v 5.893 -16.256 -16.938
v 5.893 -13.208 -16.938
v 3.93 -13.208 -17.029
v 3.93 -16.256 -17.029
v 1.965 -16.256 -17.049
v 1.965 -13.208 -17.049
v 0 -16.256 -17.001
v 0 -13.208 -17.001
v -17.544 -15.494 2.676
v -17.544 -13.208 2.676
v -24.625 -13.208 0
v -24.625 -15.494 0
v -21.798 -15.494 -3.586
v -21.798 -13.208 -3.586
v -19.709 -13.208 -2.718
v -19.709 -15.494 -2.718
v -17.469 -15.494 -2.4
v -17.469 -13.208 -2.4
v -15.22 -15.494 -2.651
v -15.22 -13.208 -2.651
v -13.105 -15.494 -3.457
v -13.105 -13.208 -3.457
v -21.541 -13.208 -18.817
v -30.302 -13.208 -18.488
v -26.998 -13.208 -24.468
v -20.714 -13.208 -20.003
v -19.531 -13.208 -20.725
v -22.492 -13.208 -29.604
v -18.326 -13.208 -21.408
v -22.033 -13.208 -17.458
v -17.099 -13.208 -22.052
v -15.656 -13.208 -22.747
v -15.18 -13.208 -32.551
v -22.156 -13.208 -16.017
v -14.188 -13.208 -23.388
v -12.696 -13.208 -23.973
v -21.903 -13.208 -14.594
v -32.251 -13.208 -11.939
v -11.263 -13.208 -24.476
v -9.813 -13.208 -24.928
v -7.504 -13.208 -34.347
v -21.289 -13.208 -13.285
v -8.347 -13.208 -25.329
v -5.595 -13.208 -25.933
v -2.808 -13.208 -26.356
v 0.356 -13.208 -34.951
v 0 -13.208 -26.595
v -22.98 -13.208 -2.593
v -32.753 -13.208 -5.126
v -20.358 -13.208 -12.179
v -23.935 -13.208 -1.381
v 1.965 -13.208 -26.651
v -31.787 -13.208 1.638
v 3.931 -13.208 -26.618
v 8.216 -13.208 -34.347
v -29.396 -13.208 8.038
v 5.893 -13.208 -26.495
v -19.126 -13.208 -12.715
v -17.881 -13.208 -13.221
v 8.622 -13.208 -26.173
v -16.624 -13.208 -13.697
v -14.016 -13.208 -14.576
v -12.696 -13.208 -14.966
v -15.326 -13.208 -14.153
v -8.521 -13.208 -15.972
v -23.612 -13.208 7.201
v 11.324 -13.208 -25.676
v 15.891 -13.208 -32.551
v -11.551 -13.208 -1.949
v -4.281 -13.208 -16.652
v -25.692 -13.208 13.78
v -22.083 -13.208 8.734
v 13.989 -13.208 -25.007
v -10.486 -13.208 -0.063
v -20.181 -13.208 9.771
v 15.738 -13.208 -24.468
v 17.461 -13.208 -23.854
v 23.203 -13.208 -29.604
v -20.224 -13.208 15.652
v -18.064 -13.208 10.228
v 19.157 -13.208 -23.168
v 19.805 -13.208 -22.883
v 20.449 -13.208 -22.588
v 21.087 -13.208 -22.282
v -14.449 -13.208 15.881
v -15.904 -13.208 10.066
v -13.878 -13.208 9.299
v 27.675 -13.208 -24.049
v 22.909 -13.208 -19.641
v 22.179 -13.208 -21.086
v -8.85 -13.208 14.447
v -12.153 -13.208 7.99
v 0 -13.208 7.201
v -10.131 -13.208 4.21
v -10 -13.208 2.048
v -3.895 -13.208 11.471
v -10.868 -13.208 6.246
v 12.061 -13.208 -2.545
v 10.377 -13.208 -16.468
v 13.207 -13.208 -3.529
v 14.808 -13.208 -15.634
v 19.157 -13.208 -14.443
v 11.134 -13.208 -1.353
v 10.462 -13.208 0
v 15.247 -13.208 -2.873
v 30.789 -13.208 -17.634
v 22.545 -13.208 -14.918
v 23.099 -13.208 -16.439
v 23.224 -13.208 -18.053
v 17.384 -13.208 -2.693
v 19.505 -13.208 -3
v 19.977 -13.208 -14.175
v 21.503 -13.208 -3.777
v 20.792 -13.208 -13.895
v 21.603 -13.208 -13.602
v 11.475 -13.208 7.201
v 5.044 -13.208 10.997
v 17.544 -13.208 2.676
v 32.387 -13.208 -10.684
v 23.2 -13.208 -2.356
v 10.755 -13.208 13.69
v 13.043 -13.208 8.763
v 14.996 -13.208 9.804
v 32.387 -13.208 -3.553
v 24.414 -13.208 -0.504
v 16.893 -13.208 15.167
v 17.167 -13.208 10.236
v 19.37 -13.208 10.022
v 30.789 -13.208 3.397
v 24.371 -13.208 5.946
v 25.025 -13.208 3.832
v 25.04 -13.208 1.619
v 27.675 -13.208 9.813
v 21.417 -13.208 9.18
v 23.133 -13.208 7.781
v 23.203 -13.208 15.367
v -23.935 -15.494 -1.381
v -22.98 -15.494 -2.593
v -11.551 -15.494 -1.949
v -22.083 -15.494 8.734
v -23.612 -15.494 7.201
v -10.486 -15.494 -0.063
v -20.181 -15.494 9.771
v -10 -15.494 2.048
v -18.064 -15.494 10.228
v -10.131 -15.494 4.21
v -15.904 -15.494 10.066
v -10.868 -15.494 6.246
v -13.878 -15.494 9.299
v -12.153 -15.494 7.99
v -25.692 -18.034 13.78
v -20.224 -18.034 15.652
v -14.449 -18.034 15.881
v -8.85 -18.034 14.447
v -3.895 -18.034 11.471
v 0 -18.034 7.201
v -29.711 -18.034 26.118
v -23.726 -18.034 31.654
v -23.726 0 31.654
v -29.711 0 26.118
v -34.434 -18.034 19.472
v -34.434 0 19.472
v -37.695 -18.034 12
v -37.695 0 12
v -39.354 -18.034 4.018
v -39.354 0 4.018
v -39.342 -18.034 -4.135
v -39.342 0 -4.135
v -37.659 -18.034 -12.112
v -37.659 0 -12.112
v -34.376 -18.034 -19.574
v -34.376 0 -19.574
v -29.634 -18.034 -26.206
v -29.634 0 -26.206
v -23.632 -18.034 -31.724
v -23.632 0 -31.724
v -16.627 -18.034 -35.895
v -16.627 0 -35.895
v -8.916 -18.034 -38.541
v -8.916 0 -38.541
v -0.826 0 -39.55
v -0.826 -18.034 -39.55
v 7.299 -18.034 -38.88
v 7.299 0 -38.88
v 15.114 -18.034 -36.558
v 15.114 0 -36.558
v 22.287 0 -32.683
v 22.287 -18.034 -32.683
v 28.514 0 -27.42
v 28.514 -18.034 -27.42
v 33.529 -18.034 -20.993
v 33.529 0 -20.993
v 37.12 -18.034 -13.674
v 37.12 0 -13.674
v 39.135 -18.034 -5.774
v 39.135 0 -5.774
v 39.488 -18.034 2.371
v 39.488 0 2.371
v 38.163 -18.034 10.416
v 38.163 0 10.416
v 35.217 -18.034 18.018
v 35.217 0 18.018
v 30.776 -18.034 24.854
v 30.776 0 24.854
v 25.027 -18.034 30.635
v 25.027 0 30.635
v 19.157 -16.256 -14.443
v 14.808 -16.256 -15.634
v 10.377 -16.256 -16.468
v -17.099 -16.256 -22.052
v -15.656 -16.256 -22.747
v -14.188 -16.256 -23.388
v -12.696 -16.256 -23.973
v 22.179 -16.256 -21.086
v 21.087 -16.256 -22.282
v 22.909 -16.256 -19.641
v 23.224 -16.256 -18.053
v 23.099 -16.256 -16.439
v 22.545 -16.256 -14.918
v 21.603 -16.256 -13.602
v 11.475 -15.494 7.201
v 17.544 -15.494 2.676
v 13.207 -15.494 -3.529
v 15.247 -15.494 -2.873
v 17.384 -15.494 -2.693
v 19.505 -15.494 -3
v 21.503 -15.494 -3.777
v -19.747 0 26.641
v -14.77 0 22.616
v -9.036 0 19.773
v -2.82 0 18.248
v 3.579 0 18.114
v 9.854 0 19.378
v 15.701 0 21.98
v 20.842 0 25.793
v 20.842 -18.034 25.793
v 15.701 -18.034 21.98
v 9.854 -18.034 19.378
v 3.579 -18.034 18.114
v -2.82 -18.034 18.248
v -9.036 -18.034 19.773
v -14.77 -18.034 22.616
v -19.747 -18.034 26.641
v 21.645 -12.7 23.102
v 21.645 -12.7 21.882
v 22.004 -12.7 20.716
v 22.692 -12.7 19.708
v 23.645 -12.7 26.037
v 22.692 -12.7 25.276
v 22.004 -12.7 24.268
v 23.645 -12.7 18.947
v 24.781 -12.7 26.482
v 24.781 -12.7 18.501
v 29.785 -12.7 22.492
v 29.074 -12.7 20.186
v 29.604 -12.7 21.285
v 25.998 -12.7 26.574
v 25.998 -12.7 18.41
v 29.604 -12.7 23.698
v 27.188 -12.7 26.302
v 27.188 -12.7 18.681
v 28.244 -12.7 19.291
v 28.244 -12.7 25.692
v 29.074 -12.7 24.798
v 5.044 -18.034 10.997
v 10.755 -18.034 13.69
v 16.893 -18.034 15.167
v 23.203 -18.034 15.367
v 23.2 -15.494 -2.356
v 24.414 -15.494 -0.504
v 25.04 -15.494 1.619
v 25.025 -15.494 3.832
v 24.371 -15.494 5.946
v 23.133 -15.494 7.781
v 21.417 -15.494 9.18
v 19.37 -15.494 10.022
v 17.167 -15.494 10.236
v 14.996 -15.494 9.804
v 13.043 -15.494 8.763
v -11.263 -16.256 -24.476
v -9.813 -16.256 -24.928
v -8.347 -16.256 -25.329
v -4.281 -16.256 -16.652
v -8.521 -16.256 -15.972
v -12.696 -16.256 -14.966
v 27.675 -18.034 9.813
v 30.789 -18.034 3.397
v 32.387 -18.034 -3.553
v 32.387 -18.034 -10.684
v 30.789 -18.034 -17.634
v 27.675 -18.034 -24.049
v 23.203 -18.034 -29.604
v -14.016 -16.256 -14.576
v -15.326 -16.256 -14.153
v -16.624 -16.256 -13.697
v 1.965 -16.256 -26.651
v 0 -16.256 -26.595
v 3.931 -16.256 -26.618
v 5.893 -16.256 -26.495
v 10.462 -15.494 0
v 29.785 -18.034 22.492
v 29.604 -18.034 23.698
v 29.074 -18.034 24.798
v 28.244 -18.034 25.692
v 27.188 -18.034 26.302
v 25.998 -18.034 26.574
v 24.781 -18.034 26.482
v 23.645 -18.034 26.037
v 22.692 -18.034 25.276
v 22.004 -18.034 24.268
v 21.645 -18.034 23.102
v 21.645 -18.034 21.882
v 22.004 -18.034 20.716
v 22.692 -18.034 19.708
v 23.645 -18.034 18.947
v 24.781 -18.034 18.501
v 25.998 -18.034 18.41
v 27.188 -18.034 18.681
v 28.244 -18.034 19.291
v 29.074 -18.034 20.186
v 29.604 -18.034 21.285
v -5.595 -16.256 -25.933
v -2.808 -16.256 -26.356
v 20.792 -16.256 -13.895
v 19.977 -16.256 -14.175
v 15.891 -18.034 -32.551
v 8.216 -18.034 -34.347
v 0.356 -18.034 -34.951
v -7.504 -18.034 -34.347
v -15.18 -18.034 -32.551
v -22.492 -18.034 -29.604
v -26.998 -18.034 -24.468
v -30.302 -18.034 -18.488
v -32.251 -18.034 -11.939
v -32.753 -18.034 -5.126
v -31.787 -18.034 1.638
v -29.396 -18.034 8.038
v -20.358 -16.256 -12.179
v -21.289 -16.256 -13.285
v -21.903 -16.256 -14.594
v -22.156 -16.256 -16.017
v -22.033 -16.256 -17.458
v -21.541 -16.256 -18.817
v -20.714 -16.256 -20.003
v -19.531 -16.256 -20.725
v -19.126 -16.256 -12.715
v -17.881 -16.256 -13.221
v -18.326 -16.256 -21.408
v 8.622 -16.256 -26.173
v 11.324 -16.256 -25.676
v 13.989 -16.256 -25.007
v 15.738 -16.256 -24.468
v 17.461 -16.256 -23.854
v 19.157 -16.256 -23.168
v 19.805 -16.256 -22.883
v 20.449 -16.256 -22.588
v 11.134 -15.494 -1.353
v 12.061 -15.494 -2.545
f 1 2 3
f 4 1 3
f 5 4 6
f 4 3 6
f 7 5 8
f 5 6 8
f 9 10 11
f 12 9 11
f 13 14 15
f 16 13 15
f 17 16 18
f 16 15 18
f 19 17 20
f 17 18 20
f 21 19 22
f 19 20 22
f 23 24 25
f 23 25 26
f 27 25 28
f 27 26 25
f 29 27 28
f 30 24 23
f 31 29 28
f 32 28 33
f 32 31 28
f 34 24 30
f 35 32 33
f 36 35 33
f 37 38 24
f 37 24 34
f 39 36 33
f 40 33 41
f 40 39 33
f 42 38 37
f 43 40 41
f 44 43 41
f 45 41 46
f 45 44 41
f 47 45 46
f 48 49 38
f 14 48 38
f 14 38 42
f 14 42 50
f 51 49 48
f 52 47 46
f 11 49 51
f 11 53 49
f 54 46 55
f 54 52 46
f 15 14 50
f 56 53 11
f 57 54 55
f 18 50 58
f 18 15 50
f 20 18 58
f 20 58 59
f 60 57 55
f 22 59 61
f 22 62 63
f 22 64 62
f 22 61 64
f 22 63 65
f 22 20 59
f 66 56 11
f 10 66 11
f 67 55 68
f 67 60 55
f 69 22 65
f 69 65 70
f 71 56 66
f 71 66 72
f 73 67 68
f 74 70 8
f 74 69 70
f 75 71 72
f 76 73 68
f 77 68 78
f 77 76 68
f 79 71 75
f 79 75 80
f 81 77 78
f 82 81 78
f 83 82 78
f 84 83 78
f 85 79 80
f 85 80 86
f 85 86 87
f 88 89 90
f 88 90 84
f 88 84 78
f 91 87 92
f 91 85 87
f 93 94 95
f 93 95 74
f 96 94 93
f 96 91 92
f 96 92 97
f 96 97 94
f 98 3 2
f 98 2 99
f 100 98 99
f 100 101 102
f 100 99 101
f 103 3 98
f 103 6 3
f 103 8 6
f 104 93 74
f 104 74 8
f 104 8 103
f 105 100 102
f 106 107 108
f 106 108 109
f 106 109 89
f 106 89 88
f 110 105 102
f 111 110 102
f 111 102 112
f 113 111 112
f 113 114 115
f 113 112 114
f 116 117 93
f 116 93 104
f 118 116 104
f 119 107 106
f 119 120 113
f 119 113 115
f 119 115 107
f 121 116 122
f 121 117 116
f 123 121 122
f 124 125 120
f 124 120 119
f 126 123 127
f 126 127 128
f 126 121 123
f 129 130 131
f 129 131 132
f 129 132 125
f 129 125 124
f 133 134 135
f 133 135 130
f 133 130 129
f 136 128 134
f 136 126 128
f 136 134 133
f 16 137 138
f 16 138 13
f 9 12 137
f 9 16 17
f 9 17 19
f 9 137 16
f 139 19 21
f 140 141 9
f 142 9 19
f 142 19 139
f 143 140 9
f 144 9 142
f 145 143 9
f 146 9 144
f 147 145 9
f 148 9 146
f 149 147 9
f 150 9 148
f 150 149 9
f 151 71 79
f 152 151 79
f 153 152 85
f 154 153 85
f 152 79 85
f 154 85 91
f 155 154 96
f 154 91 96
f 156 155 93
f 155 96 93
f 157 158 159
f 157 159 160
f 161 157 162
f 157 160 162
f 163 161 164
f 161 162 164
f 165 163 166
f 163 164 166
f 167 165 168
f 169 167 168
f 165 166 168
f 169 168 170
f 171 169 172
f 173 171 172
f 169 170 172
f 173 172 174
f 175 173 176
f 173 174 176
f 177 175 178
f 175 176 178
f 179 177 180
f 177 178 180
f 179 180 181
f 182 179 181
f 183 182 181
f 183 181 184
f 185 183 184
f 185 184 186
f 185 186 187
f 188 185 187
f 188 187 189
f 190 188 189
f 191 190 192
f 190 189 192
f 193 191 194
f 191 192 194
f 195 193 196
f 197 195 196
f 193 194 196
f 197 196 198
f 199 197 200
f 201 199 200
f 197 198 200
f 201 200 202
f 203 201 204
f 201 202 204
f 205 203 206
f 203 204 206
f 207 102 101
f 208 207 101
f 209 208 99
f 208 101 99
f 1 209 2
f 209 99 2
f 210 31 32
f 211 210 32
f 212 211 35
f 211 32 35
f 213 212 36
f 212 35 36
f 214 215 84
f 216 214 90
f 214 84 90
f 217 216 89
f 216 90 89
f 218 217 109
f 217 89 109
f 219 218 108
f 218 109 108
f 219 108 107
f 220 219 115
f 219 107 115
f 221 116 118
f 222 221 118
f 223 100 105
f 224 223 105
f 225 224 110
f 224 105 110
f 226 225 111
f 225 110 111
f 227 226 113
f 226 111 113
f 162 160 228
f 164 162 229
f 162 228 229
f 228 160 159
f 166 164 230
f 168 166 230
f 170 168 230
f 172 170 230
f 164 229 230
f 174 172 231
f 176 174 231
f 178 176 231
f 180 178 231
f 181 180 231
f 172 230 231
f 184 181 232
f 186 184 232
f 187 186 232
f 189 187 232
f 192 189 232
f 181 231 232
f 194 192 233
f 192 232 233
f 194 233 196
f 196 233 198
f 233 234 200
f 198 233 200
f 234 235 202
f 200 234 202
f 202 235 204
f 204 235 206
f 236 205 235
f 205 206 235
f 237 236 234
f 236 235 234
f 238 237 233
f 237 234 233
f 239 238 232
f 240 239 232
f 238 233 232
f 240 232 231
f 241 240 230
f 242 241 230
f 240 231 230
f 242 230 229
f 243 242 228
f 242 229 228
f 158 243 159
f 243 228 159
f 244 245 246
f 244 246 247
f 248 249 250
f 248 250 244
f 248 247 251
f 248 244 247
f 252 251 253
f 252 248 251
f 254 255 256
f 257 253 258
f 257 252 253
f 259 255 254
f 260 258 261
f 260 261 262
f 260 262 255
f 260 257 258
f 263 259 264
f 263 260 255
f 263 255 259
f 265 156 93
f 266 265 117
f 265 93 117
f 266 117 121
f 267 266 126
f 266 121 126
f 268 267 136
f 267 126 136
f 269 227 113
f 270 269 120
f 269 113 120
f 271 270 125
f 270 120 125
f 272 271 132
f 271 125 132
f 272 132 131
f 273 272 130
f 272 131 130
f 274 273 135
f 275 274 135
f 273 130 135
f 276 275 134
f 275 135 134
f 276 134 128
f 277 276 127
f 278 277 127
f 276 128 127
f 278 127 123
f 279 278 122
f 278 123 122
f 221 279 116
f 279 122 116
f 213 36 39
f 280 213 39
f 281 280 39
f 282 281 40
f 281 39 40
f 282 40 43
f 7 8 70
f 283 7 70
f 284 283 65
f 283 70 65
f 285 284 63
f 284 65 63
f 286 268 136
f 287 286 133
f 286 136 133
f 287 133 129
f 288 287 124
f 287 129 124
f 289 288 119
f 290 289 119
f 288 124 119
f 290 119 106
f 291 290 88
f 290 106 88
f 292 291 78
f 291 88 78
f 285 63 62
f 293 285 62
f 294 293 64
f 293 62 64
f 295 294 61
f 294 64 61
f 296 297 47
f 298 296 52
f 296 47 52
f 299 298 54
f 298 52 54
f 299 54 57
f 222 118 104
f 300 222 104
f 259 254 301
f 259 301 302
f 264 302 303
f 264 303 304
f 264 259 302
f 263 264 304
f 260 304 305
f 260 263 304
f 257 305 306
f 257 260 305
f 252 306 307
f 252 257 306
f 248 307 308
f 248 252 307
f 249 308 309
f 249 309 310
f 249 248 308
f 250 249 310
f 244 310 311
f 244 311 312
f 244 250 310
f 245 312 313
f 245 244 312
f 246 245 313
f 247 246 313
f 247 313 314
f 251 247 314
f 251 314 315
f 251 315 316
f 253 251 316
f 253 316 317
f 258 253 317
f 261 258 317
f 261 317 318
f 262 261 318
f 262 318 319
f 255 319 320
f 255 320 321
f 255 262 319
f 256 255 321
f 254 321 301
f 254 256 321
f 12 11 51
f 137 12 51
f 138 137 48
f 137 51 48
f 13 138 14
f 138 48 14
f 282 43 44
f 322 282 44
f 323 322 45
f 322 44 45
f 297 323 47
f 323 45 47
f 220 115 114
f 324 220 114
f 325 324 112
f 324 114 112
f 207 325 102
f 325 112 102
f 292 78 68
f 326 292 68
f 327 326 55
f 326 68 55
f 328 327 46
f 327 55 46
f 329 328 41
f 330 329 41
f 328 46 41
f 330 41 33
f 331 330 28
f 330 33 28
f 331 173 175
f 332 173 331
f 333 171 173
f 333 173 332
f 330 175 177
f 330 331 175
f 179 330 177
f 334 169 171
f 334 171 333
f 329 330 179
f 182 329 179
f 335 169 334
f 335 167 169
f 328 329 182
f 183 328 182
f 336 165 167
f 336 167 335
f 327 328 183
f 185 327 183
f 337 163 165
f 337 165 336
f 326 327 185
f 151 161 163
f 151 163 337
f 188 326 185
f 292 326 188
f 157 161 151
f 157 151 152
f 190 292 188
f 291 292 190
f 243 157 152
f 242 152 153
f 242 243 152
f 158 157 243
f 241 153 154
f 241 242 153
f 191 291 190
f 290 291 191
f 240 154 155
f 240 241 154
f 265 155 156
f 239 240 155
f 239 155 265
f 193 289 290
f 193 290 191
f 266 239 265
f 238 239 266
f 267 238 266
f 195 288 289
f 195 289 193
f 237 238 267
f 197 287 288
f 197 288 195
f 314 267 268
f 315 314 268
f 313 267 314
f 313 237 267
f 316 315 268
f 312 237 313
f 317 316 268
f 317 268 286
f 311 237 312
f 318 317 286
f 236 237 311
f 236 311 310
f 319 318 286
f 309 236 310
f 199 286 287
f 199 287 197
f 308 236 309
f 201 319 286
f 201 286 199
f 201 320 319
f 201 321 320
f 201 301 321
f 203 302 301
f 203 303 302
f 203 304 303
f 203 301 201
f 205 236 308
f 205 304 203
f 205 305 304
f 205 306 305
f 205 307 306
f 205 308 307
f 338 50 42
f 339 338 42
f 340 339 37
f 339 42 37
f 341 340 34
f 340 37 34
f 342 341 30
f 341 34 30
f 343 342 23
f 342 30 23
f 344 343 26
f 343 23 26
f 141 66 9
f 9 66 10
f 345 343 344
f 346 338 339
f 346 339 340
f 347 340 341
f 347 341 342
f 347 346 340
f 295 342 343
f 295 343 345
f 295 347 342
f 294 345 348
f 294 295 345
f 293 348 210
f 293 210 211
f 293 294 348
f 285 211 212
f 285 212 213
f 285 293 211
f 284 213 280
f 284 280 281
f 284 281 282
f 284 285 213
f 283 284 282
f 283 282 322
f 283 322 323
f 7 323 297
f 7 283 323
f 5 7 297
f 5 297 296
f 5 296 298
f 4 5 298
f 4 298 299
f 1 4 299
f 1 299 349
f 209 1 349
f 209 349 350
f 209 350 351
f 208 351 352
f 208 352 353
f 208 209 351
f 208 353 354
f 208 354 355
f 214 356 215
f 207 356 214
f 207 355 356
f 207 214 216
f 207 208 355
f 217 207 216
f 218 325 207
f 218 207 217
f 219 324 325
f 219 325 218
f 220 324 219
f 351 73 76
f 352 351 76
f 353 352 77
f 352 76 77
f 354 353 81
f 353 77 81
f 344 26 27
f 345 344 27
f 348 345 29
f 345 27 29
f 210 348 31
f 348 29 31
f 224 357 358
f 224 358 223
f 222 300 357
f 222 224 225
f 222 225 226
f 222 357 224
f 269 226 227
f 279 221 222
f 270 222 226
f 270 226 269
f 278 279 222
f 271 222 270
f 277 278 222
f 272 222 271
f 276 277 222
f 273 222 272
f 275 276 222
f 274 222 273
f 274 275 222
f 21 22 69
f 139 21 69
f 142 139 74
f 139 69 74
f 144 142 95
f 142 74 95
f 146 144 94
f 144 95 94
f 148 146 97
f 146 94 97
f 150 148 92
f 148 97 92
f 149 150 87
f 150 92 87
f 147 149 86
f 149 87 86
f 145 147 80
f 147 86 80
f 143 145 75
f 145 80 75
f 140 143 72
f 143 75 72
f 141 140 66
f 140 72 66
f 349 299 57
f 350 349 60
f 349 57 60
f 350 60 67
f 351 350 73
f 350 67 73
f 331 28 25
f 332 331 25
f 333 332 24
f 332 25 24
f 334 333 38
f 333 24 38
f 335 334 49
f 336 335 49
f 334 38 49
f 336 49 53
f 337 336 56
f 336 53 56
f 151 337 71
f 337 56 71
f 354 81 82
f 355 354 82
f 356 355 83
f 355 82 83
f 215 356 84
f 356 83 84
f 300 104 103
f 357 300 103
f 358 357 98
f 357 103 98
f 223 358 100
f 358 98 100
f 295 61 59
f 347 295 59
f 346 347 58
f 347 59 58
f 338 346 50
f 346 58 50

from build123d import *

# Parameters (mm, degrees)
F1_DEPTH = 12.7
F4_DEPTH = 2.794
F5_DEPTH = 3.556
F7_DEPTH = 0.508
F8_R     = 4.0932616512
F9_DEPTH = 5.334


with BuildPart() as f1:
    # F0 (on Front) → F1 (new body)
    with BuildSketch(Plane.XZ):
        with BuildLine():
            ThreePointArc((25.0273931209, 30.6353052518), (0.3760595222, 18.0051146813), (-23.726411007, 31.6535899232))
            ThreePointArc((-23.726411007, 31.6535899232), (-0.8260535898, -39.5500944344), (25.0273931209, 30.6353052518))
        make_face()
    extrude(amount=F1_DEPTH)

    # F2 (on face) → F4 (join)
    with BuildSketch(Plane.XZ.offset(12.7)):
        with BuildLine():
            Line((-17.5436979513, 2.6755574061), (-24.6252994984, 0))
            ThreePointArc((-24.6252994984, 0), (-23.4886257248, -2.0111815106), (-21.798320189, -3.5859022896))
            ThreePointArc((-21.798320189, -3.5859022896), (-17.4685188777, -2.3995249593), (-13.1054765957, -3.4571319799))
            ThreePointArc((-13.1054765957, -3.4571319799), (-12.1526852264, 7.9901288569), (-23.6123846381, 7.2009004653))
            Line((-23.6123846381, 7.2009004653), (-17.5436979513, 2.6755574061))
        make_face()
        with BuildLine():
            ThreePointArc((21.5031847078, -3.7765858449), (23.1328376444, 7.7813585574), (11.4750112645, 7.2009004653))
            Line((11.4750112645, 7.2009004653), (17.5436979513, 2.6755574061))
            Line((17.5436979513, 2.6755574061), (10.4620964041, 0))
            ThreePointArc((10.4620964041, 0), (11.5679326814, -1.971798546), (13.2067047826, -3.5291326072))
            ThreePointArc((13.2067047826, -3.5291326072), (17.3835685766, -2.6931747019), (21.5031847078, -3.7765858449))
        make_face()
    extrude(amount=F4_DEPTH)

    # F3 (on face) → F5 (join)
    with BuildSketch(Plane.XZ.offset(12.7)):
        with BuildLine():
            ThreePointArc((-16.6242958605, -13.6971237379), (-18.5050049332, -12.9721756726), (-20.3581005335, -12.1792992577))
            ThreePointArc((-20.3581005335, -12.1792992577), (-22.1561373864, -16.0172531608), (-20.7136999816, -20.0025010854))
            ThreePointArc((-20.7136999816, -20.0025010854), (-18.9311591949, -21.0712313357), (-17.0989353576, -22.052348971))
            Line((-17.0989353576, -22.052348971), (-16.6242958605, -13.6971237379))
        make_face()
        with BuildLine():
            ThreePointArc((-12.6964952724, -14.9659873575), (-14.6722160438, -14.368146145), (-16.6242958605, -13.6971237379))
            Line((-16.6242958605, -13.6971237379), (-17.0989353576, -22.052348971))
            ThreePointArc((-17.0989353576, -22.052348971), (-14.9246231849, -23.0743286561), (-12.6964952724, -23.9729508833))
            Line((-12.6964952724, -23.9729508833), (-12.6964952724, -14.9659873575))
        make_face()
        with BuildLine():
            ThreePointArc((0, -17.0006339589), (-6.4074737383, -16.3528902815), (-12.6964952724, -14.9659873575))
            Line((-12.6964952724, -14.9659873575), (-12.6964952724, -23.9729508833))
            ThreePointArc((-12.6964952724, -23.9729508833), (-10.5399154671, -24.7086802755), (-8.3473040499, -25.3288329734))
            ThreePointArc((-8.3473040499, -25.3288329734), (-4.2048726292, -26.1675803087), (0, -26.5945244967))
            Line((0, -26.5945244967), (0, -17.0006339589))
        make_face()
        with BuildLine():
            ThreePointArc((5.8929180982, -16.9381003904), (2.9472910815, -17.047774638), (0, -17.0006339589))
            Line((0, -17.0006339589), (0, -26.5945244967))
            ThreePointArc((0, -26.5945244967), (2.9481689707, -26.6461592475), (5.8929180982, -26.4950996461))
            Line((5.8929180982, -26.4950996461), (5.8929180982, -16.9381003904))
        make_face()
        with BuildLine():
            ThreePointArc((19.1572063101, -14.4431000637), (12.6013208797, -16.0960178297), (5.8929180982, -16.9381003904))
            Line((5.8929180982, -16.9381003904), (5.8929180982, -26.4950996461))
            ThreePointArc((5.8929180982, -26.4950996461), (9.9769028198, -25.9458134618), (13.9893206769, -25.0071178464))
            ThreePointArc((13.9893206769, -25.0071178464), (16.6026933877, -24.1703555629), (19.1572063101, -23.1681820381))
            Line((19.1572063101, -23.1681820381), (19.1572063101, -14.4431000637))
        make_face()
        with BuildLine():
            ThreePointArc((21.6026995331, -13.6017007753), (20.3848629816, -14.0366713116), (19.1572063101, -14.4431000637))
            Line((19.1572063101, -14.4431000637), (19.1572063101, -23.1681820381))
            ThreePointArc((19.1572063101, -23.1681820381), (20.1276903937, -22.7368350705), (21.0871963633, -22.2815902384))
            ThreePointArc((21.0871963633, -22.2815902384), (23.2235021691, -18.0532138234), (21.6026995331, -13.6017007753))
        make_face()
    extrude(amount=F5_DEPTH)

    # F6 (on face) → F7 (join)
    with BuildSketch(Plane.XZ.offset(12.7)):
        with BuildLine():
            ThreePointArc((0, 7.2009004653), (-11.5972409177, 15.3673055662), (-25.6920997053, 13.7795004994))
            ThreePointArc((-25.6920997053, 13.7795004994), (-32.6858017864, -8.5460763608), (-22.4917009473, -29.6037010849))
            ThreePointArc((-22.4917009473, -29.6037010849), (0.3555994481, -34.9506746467), (23.2028998435, -29.6037010849))
            ThreePointArc((23.2028998435, -29.6037010849), (32.5884250894, -7.1181977593), (23.2028998435, 15.3673055662))
            ThreePointArc((23.2028998435, 15.3673055662), (10.754620627, 13.690167259), (0, 7.2009004653))
        make_face()
    extrude(amount=F7_DEPTH)

    # F8 (on face) → F9 (join)
    with BuildSketch(Plane.XZ.offset(12.7)):
        with BuildLine():
            ThreePointArc((-23.726411007, 31.6535899232), (-0.8260535898, -39.5500944344), (25.0273931209, 30.6353052518))
            ThreePointArc((25.0273931209, 30.6353052518), (0.3760595222, 18.0051146813), (-23.726411007, 31.6535899232))
        make_face()
        with BuildLine():
            ThreePointArc((0, 7.2009004653), (10.754620627, 13.690167259), (23.2028998435, 15.3673055662))
            ThreePointArc((23.2028998435, 15.3673055662), (32.5884250894, -7.1181977593), (23.2028998435, -29.6037010849))
            ThreePointArc((23.2028998435, -29.6037010849), (0.3555994481, -34.9506746467), (-22.4917009473, -29.6037010849))
            ThreePointArc((-22.4917009473, -29.6037010849), (-32.6858017864, -8.5460763608), (-25.6920997053, 13.7795004994))
            ThreePointArc((-25.6920997053, 13.7795004994), (-11.5972409177, 15.3673055662), (0, 7.2009004653))
        make_face(mode=Mode.SUBTRACT)
        with Locations((25.6920978427, 22.4917009473)):
            Circle(F8_R, mode=Mode.SUBTRACT)
    extrude(amount=F9_DEPTH)


solid = f1.part
